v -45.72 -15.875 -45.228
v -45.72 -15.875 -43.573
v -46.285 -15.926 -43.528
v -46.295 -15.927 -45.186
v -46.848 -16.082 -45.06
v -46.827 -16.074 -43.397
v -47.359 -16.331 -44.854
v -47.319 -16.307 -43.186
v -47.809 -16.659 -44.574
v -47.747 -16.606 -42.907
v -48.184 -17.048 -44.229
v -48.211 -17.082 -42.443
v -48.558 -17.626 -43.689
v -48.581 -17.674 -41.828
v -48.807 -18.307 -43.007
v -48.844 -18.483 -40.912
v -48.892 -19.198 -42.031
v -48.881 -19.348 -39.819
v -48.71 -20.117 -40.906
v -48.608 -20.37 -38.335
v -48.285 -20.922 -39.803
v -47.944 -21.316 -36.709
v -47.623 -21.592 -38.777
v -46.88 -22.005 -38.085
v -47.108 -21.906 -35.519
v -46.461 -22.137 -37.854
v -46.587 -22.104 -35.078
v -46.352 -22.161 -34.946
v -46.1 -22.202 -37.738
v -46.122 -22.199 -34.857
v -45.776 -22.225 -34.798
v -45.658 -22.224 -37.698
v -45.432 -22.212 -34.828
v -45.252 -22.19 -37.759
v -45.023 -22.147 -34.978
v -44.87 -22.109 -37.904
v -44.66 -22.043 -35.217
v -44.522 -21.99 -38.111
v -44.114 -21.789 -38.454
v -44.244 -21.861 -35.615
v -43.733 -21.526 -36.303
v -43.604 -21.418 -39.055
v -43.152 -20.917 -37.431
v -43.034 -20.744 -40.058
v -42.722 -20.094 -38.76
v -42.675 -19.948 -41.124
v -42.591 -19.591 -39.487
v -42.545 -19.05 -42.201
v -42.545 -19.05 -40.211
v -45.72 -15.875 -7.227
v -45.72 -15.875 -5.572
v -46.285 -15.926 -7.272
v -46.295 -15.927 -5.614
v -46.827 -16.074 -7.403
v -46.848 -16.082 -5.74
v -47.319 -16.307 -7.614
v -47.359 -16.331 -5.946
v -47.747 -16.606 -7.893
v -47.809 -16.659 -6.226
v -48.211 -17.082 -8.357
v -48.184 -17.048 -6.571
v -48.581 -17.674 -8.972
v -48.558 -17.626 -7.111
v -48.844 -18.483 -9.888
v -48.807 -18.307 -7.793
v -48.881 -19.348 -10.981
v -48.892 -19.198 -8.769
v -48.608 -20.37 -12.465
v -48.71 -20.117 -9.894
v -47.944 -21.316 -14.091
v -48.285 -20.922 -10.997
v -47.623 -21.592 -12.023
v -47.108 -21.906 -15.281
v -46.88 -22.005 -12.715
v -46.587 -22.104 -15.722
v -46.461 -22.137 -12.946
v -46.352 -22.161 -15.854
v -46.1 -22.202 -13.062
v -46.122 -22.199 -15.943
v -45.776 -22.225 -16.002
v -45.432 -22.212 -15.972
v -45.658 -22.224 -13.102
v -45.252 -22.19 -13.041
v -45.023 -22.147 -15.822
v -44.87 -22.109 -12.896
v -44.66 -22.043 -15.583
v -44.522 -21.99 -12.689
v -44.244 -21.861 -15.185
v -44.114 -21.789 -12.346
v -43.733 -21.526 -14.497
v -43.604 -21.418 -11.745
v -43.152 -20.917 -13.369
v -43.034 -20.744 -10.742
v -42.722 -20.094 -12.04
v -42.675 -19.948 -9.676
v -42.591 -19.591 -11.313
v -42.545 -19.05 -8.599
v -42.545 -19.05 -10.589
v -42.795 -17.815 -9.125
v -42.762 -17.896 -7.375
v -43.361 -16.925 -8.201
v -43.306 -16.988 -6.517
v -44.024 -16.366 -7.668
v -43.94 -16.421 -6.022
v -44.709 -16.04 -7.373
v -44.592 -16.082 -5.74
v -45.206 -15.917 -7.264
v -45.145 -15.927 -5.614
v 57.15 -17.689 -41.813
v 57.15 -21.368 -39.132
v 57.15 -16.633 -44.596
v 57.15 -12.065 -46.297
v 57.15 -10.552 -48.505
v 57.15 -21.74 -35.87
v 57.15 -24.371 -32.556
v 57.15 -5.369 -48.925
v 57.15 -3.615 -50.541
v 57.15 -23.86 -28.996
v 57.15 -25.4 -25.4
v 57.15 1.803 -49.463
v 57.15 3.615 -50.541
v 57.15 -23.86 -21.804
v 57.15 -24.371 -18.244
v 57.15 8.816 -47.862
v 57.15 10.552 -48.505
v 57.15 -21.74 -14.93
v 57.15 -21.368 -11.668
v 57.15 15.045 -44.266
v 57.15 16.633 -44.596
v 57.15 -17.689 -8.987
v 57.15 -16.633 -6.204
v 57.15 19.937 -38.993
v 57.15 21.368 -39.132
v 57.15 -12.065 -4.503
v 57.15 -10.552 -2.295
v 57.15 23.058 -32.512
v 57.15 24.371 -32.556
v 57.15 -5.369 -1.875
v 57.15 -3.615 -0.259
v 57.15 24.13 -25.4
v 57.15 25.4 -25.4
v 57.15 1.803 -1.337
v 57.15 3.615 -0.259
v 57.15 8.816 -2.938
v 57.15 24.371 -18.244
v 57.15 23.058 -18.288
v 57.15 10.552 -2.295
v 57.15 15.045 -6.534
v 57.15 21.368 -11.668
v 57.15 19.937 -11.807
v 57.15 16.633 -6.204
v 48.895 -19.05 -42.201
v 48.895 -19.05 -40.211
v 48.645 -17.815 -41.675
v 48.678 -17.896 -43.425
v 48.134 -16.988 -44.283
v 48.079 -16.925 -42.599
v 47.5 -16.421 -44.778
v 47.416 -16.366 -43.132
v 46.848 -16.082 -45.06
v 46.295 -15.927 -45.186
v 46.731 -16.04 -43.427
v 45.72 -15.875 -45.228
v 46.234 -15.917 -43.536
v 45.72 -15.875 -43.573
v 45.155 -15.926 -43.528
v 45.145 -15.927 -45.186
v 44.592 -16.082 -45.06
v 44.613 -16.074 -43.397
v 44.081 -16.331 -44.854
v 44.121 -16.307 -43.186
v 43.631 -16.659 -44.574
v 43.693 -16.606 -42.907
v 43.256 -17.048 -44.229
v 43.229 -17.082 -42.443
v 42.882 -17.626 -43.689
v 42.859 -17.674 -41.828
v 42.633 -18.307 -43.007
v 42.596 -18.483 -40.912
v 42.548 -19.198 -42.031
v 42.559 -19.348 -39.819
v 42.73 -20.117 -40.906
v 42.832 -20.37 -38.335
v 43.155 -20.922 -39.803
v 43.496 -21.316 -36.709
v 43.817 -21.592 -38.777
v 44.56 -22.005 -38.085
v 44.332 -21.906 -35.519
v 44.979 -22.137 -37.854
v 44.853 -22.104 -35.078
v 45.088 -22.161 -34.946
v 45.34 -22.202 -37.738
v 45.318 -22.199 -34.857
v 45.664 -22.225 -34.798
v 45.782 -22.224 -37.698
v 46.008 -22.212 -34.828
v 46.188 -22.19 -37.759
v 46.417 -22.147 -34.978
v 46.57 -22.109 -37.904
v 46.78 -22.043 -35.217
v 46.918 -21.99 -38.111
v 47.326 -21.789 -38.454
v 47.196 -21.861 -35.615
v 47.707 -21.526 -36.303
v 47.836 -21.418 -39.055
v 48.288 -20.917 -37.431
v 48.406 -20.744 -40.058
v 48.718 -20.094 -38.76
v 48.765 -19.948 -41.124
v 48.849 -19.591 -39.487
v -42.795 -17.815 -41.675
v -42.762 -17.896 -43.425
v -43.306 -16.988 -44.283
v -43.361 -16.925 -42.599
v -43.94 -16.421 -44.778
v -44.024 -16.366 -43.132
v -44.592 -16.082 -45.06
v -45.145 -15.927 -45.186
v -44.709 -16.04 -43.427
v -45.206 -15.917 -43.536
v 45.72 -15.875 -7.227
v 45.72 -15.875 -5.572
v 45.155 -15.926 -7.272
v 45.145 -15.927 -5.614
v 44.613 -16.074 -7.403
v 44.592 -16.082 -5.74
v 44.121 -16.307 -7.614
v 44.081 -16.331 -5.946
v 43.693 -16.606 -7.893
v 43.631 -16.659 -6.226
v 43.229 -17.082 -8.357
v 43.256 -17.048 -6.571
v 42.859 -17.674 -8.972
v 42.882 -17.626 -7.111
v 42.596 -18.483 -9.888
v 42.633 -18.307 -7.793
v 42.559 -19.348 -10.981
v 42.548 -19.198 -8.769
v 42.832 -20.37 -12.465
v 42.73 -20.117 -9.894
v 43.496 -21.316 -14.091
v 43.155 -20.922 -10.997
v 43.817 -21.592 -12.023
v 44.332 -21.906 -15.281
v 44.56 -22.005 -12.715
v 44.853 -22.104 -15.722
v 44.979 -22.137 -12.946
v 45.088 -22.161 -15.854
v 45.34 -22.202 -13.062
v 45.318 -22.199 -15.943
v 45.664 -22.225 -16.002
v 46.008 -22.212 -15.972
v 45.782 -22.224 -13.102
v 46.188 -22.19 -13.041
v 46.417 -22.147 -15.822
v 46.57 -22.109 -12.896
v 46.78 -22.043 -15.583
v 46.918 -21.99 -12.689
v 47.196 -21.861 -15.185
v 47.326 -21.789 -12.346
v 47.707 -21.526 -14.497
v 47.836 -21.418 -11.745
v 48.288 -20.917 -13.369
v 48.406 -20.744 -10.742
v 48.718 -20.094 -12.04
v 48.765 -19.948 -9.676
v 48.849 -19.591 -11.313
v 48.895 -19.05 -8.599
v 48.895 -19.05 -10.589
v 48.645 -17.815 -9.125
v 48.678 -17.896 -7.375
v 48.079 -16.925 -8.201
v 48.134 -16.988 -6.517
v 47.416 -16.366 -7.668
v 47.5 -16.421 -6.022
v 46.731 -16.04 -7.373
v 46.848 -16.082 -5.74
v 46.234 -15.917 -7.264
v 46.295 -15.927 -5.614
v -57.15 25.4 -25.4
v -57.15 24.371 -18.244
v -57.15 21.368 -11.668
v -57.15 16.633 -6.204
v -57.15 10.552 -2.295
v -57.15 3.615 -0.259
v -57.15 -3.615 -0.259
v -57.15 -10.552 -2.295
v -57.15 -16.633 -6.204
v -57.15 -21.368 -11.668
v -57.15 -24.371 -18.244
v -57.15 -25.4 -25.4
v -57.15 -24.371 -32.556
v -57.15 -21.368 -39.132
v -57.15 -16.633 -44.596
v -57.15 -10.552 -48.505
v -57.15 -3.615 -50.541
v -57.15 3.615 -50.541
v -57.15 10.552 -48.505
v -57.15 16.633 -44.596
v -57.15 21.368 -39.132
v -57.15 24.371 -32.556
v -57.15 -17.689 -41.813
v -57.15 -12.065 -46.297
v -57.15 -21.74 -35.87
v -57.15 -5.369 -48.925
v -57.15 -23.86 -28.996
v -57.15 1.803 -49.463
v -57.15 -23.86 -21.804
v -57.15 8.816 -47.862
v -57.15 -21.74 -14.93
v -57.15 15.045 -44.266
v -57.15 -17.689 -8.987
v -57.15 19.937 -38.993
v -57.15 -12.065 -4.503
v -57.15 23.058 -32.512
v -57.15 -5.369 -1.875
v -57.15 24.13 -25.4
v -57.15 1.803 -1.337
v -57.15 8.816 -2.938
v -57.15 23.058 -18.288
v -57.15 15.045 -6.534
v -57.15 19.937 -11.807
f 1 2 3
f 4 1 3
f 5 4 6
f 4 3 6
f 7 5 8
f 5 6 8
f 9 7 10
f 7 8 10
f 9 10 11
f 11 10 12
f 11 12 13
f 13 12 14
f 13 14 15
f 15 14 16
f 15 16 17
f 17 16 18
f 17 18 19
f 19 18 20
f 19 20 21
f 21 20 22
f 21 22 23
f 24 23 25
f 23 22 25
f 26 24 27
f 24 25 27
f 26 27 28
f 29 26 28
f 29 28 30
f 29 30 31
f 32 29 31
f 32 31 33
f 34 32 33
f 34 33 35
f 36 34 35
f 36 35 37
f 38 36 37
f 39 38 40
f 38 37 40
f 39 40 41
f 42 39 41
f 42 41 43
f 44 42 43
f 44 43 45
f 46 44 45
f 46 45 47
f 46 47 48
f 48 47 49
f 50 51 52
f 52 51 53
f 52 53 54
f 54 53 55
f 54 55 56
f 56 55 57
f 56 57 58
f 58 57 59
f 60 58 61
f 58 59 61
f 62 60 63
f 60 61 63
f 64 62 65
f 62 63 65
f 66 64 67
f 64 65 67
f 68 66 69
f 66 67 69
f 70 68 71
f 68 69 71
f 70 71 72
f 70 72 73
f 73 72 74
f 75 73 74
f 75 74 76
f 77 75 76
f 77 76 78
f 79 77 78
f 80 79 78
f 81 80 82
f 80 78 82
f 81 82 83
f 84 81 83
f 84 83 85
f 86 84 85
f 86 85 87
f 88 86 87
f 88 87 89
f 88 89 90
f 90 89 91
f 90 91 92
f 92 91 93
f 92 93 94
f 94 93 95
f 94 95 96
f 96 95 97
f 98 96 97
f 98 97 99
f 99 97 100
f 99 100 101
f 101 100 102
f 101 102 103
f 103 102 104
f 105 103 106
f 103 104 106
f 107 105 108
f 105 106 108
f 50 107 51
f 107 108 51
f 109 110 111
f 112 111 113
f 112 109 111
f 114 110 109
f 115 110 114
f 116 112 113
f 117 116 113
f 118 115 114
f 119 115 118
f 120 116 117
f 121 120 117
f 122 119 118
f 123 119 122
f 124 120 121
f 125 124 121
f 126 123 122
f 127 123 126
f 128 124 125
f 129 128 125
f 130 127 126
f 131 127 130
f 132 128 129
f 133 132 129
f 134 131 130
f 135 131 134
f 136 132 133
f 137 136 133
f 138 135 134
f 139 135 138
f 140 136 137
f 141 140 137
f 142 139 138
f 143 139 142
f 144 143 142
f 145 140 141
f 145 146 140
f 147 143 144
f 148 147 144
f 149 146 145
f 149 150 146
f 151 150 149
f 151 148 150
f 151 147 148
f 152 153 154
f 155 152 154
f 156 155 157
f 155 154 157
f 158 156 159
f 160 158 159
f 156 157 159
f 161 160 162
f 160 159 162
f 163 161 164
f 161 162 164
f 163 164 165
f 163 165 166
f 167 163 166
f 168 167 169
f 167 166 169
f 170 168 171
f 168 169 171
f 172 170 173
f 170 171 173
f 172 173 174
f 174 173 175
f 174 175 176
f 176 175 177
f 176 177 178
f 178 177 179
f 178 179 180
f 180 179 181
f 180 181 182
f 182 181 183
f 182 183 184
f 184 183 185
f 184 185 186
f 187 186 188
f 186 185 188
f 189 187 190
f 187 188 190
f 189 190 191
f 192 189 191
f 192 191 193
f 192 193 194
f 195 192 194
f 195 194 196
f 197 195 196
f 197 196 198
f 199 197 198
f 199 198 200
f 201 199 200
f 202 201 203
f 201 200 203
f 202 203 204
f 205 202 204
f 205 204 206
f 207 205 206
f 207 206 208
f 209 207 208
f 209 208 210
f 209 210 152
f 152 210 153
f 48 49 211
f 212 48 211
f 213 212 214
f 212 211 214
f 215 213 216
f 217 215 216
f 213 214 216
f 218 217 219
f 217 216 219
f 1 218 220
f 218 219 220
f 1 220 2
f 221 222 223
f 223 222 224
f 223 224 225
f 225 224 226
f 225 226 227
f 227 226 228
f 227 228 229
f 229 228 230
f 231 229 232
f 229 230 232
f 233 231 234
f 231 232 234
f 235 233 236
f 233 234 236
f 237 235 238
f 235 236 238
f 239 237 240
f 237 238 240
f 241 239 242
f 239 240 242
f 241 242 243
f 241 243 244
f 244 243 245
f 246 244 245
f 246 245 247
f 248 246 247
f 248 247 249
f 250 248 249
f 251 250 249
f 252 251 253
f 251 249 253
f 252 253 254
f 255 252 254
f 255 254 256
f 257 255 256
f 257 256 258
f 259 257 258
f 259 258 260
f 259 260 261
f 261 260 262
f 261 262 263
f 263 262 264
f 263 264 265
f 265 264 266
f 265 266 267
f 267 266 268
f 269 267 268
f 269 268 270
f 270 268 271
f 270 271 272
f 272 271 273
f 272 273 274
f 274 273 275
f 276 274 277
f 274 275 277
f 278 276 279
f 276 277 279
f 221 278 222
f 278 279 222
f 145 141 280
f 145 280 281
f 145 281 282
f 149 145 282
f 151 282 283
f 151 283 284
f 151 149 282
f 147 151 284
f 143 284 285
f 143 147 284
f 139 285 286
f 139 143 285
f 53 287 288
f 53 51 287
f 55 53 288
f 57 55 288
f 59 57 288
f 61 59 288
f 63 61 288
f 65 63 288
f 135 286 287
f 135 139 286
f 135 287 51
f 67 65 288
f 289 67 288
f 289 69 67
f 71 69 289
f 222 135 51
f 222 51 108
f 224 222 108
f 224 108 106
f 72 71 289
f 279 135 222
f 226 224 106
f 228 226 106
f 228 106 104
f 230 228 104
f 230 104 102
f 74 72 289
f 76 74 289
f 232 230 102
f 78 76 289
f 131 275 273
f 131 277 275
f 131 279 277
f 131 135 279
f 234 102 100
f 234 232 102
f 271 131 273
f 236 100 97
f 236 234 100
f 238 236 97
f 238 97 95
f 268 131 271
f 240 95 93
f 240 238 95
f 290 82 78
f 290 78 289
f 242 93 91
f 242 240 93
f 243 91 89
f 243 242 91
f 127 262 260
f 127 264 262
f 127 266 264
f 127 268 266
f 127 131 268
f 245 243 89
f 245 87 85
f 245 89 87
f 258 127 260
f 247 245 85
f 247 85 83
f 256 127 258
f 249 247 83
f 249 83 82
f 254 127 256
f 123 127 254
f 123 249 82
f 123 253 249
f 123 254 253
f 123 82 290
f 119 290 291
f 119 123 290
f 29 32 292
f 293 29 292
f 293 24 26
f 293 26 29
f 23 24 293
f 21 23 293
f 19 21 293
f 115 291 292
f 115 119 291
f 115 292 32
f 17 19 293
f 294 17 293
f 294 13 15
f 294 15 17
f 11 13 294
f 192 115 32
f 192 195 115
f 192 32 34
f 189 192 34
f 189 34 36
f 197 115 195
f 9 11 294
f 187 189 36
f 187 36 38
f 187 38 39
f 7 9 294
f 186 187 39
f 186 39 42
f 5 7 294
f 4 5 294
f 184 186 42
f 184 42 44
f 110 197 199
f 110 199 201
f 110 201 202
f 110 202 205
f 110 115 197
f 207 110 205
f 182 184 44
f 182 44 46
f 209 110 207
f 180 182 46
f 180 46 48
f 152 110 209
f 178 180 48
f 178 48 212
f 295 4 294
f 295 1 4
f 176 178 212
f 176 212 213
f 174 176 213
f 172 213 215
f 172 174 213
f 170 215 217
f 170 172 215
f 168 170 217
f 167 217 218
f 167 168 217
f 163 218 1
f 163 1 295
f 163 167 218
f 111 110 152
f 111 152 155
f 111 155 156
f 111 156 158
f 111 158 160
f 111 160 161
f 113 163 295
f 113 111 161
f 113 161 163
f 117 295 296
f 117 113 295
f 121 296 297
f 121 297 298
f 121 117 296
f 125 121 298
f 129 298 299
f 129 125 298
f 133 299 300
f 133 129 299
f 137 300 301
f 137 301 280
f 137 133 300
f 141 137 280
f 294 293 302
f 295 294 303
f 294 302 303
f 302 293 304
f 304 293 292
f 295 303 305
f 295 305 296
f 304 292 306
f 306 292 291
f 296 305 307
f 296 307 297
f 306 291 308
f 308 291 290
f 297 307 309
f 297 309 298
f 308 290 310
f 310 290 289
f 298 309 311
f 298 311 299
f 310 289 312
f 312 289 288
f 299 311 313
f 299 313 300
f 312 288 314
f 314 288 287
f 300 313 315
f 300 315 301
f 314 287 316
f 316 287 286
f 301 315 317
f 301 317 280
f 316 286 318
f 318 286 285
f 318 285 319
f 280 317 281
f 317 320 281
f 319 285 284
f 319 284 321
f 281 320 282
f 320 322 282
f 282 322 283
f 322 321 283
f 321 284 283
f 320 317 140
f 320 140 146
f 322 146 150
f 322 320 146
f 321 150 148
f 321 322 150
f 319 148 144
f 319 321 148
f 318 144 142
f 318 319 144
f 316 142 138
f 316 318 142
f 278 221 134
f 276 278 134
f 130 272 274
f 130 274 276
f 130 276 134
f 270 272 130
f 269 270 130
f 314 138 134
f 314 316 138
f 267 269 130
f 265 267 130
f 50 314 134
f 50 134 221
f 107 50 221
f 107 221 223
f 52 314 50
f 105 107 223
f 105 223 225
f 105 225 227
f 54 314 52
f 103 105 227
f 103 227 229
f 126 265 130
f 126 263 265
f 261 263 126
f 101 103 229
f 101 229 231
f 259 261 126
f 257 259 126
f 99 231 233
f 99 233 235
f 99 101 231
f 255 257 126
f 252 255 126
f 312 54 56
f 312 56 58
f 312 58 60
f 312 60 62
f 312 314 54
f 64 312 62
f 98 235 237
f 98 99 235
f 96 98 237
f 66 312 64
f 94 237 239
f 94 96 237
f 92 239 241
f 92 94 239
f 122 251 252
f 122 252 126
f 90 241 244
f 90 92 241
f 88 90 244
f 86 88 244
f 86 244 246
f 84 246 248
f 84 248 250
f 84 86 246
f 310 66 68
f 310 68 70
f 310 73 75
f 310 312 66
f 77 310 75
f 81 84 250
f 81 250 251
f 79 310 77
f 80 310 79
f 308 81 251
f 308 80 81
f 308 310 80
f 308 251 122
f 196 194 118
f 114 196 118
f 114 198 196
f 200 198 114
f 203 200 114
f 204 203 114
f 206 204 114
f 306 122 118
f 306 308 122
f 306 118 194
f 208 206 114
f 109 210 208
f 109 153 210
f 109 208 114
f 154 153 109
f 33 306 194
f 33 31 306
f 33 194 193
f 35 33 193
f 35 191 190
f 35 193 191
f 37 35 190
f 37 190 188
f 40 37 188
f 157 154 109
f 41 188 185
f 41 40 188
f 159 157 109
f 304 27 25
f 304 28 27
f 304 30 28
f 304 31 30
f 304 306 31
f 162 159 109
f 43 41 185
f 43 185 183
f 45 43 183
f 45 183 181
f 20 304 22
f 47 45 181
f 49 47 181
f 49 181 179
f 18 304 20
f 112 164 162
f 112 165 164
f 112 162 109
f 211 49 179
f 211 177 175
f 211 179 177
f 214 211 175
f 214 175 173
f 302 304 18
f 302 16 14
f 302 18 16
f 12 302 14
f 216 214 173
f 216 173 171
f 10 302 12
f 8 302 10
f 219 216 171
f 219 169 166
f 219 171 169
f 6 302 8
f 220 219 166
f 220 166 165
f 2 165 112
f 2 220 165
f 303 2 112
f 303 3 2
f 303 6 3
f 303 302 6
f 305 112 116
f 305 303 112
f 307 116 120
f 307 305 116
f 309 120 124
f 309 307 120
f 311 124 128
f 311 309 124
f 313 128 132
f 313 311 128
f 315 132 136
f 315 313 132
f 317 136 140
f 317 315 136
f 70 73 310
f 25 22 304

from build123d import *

# Parameters (mm, degrees)
F0_R     = 25.4
F0_R_2   = 24.13
F1_DEPTH = 57.15
F3_DEPTH = 50.8


with BuildPart() as f1:
    # F0 (on Right) → F1 (new body, symmetric)
    with BuildSketch(Plane.YZ):
        with Locations((0, -25.4)):
            Circle(F0_R)
        with Locations((0, -25.4)):
            Circle(F0_R_2, mode=Mode.SUBTRACT)
    extrude(amount=F1_DEPTH, both=True)

    # F2 (on Top) → F3 (cut)
    with BuildSketch(Plane.XY):
        with BuildLine():
            ThreePointArc((48.895, -19.05), (47.9650640303, -16.8049359697), (45.72, -15.875))
            ThreePointArc((45.72, -15.875), (43.4749359697, -21.2950640303), (48.895, -19.05))
        make_face()
        with BuildLine():
            ThreePointArc((-42.545, -19.05), (-43.4749359697, -16.8049359697), (-45.72, -15.875))
            ThreePointArc((-45.72, -15.875), (-47.9650640303, -21.2950640303), (-42.545, -19.05))
        make_face()
    extrude(amount=-F3_DEPTH, mode=Mode.SUBTRACT)


solid = f1.part
